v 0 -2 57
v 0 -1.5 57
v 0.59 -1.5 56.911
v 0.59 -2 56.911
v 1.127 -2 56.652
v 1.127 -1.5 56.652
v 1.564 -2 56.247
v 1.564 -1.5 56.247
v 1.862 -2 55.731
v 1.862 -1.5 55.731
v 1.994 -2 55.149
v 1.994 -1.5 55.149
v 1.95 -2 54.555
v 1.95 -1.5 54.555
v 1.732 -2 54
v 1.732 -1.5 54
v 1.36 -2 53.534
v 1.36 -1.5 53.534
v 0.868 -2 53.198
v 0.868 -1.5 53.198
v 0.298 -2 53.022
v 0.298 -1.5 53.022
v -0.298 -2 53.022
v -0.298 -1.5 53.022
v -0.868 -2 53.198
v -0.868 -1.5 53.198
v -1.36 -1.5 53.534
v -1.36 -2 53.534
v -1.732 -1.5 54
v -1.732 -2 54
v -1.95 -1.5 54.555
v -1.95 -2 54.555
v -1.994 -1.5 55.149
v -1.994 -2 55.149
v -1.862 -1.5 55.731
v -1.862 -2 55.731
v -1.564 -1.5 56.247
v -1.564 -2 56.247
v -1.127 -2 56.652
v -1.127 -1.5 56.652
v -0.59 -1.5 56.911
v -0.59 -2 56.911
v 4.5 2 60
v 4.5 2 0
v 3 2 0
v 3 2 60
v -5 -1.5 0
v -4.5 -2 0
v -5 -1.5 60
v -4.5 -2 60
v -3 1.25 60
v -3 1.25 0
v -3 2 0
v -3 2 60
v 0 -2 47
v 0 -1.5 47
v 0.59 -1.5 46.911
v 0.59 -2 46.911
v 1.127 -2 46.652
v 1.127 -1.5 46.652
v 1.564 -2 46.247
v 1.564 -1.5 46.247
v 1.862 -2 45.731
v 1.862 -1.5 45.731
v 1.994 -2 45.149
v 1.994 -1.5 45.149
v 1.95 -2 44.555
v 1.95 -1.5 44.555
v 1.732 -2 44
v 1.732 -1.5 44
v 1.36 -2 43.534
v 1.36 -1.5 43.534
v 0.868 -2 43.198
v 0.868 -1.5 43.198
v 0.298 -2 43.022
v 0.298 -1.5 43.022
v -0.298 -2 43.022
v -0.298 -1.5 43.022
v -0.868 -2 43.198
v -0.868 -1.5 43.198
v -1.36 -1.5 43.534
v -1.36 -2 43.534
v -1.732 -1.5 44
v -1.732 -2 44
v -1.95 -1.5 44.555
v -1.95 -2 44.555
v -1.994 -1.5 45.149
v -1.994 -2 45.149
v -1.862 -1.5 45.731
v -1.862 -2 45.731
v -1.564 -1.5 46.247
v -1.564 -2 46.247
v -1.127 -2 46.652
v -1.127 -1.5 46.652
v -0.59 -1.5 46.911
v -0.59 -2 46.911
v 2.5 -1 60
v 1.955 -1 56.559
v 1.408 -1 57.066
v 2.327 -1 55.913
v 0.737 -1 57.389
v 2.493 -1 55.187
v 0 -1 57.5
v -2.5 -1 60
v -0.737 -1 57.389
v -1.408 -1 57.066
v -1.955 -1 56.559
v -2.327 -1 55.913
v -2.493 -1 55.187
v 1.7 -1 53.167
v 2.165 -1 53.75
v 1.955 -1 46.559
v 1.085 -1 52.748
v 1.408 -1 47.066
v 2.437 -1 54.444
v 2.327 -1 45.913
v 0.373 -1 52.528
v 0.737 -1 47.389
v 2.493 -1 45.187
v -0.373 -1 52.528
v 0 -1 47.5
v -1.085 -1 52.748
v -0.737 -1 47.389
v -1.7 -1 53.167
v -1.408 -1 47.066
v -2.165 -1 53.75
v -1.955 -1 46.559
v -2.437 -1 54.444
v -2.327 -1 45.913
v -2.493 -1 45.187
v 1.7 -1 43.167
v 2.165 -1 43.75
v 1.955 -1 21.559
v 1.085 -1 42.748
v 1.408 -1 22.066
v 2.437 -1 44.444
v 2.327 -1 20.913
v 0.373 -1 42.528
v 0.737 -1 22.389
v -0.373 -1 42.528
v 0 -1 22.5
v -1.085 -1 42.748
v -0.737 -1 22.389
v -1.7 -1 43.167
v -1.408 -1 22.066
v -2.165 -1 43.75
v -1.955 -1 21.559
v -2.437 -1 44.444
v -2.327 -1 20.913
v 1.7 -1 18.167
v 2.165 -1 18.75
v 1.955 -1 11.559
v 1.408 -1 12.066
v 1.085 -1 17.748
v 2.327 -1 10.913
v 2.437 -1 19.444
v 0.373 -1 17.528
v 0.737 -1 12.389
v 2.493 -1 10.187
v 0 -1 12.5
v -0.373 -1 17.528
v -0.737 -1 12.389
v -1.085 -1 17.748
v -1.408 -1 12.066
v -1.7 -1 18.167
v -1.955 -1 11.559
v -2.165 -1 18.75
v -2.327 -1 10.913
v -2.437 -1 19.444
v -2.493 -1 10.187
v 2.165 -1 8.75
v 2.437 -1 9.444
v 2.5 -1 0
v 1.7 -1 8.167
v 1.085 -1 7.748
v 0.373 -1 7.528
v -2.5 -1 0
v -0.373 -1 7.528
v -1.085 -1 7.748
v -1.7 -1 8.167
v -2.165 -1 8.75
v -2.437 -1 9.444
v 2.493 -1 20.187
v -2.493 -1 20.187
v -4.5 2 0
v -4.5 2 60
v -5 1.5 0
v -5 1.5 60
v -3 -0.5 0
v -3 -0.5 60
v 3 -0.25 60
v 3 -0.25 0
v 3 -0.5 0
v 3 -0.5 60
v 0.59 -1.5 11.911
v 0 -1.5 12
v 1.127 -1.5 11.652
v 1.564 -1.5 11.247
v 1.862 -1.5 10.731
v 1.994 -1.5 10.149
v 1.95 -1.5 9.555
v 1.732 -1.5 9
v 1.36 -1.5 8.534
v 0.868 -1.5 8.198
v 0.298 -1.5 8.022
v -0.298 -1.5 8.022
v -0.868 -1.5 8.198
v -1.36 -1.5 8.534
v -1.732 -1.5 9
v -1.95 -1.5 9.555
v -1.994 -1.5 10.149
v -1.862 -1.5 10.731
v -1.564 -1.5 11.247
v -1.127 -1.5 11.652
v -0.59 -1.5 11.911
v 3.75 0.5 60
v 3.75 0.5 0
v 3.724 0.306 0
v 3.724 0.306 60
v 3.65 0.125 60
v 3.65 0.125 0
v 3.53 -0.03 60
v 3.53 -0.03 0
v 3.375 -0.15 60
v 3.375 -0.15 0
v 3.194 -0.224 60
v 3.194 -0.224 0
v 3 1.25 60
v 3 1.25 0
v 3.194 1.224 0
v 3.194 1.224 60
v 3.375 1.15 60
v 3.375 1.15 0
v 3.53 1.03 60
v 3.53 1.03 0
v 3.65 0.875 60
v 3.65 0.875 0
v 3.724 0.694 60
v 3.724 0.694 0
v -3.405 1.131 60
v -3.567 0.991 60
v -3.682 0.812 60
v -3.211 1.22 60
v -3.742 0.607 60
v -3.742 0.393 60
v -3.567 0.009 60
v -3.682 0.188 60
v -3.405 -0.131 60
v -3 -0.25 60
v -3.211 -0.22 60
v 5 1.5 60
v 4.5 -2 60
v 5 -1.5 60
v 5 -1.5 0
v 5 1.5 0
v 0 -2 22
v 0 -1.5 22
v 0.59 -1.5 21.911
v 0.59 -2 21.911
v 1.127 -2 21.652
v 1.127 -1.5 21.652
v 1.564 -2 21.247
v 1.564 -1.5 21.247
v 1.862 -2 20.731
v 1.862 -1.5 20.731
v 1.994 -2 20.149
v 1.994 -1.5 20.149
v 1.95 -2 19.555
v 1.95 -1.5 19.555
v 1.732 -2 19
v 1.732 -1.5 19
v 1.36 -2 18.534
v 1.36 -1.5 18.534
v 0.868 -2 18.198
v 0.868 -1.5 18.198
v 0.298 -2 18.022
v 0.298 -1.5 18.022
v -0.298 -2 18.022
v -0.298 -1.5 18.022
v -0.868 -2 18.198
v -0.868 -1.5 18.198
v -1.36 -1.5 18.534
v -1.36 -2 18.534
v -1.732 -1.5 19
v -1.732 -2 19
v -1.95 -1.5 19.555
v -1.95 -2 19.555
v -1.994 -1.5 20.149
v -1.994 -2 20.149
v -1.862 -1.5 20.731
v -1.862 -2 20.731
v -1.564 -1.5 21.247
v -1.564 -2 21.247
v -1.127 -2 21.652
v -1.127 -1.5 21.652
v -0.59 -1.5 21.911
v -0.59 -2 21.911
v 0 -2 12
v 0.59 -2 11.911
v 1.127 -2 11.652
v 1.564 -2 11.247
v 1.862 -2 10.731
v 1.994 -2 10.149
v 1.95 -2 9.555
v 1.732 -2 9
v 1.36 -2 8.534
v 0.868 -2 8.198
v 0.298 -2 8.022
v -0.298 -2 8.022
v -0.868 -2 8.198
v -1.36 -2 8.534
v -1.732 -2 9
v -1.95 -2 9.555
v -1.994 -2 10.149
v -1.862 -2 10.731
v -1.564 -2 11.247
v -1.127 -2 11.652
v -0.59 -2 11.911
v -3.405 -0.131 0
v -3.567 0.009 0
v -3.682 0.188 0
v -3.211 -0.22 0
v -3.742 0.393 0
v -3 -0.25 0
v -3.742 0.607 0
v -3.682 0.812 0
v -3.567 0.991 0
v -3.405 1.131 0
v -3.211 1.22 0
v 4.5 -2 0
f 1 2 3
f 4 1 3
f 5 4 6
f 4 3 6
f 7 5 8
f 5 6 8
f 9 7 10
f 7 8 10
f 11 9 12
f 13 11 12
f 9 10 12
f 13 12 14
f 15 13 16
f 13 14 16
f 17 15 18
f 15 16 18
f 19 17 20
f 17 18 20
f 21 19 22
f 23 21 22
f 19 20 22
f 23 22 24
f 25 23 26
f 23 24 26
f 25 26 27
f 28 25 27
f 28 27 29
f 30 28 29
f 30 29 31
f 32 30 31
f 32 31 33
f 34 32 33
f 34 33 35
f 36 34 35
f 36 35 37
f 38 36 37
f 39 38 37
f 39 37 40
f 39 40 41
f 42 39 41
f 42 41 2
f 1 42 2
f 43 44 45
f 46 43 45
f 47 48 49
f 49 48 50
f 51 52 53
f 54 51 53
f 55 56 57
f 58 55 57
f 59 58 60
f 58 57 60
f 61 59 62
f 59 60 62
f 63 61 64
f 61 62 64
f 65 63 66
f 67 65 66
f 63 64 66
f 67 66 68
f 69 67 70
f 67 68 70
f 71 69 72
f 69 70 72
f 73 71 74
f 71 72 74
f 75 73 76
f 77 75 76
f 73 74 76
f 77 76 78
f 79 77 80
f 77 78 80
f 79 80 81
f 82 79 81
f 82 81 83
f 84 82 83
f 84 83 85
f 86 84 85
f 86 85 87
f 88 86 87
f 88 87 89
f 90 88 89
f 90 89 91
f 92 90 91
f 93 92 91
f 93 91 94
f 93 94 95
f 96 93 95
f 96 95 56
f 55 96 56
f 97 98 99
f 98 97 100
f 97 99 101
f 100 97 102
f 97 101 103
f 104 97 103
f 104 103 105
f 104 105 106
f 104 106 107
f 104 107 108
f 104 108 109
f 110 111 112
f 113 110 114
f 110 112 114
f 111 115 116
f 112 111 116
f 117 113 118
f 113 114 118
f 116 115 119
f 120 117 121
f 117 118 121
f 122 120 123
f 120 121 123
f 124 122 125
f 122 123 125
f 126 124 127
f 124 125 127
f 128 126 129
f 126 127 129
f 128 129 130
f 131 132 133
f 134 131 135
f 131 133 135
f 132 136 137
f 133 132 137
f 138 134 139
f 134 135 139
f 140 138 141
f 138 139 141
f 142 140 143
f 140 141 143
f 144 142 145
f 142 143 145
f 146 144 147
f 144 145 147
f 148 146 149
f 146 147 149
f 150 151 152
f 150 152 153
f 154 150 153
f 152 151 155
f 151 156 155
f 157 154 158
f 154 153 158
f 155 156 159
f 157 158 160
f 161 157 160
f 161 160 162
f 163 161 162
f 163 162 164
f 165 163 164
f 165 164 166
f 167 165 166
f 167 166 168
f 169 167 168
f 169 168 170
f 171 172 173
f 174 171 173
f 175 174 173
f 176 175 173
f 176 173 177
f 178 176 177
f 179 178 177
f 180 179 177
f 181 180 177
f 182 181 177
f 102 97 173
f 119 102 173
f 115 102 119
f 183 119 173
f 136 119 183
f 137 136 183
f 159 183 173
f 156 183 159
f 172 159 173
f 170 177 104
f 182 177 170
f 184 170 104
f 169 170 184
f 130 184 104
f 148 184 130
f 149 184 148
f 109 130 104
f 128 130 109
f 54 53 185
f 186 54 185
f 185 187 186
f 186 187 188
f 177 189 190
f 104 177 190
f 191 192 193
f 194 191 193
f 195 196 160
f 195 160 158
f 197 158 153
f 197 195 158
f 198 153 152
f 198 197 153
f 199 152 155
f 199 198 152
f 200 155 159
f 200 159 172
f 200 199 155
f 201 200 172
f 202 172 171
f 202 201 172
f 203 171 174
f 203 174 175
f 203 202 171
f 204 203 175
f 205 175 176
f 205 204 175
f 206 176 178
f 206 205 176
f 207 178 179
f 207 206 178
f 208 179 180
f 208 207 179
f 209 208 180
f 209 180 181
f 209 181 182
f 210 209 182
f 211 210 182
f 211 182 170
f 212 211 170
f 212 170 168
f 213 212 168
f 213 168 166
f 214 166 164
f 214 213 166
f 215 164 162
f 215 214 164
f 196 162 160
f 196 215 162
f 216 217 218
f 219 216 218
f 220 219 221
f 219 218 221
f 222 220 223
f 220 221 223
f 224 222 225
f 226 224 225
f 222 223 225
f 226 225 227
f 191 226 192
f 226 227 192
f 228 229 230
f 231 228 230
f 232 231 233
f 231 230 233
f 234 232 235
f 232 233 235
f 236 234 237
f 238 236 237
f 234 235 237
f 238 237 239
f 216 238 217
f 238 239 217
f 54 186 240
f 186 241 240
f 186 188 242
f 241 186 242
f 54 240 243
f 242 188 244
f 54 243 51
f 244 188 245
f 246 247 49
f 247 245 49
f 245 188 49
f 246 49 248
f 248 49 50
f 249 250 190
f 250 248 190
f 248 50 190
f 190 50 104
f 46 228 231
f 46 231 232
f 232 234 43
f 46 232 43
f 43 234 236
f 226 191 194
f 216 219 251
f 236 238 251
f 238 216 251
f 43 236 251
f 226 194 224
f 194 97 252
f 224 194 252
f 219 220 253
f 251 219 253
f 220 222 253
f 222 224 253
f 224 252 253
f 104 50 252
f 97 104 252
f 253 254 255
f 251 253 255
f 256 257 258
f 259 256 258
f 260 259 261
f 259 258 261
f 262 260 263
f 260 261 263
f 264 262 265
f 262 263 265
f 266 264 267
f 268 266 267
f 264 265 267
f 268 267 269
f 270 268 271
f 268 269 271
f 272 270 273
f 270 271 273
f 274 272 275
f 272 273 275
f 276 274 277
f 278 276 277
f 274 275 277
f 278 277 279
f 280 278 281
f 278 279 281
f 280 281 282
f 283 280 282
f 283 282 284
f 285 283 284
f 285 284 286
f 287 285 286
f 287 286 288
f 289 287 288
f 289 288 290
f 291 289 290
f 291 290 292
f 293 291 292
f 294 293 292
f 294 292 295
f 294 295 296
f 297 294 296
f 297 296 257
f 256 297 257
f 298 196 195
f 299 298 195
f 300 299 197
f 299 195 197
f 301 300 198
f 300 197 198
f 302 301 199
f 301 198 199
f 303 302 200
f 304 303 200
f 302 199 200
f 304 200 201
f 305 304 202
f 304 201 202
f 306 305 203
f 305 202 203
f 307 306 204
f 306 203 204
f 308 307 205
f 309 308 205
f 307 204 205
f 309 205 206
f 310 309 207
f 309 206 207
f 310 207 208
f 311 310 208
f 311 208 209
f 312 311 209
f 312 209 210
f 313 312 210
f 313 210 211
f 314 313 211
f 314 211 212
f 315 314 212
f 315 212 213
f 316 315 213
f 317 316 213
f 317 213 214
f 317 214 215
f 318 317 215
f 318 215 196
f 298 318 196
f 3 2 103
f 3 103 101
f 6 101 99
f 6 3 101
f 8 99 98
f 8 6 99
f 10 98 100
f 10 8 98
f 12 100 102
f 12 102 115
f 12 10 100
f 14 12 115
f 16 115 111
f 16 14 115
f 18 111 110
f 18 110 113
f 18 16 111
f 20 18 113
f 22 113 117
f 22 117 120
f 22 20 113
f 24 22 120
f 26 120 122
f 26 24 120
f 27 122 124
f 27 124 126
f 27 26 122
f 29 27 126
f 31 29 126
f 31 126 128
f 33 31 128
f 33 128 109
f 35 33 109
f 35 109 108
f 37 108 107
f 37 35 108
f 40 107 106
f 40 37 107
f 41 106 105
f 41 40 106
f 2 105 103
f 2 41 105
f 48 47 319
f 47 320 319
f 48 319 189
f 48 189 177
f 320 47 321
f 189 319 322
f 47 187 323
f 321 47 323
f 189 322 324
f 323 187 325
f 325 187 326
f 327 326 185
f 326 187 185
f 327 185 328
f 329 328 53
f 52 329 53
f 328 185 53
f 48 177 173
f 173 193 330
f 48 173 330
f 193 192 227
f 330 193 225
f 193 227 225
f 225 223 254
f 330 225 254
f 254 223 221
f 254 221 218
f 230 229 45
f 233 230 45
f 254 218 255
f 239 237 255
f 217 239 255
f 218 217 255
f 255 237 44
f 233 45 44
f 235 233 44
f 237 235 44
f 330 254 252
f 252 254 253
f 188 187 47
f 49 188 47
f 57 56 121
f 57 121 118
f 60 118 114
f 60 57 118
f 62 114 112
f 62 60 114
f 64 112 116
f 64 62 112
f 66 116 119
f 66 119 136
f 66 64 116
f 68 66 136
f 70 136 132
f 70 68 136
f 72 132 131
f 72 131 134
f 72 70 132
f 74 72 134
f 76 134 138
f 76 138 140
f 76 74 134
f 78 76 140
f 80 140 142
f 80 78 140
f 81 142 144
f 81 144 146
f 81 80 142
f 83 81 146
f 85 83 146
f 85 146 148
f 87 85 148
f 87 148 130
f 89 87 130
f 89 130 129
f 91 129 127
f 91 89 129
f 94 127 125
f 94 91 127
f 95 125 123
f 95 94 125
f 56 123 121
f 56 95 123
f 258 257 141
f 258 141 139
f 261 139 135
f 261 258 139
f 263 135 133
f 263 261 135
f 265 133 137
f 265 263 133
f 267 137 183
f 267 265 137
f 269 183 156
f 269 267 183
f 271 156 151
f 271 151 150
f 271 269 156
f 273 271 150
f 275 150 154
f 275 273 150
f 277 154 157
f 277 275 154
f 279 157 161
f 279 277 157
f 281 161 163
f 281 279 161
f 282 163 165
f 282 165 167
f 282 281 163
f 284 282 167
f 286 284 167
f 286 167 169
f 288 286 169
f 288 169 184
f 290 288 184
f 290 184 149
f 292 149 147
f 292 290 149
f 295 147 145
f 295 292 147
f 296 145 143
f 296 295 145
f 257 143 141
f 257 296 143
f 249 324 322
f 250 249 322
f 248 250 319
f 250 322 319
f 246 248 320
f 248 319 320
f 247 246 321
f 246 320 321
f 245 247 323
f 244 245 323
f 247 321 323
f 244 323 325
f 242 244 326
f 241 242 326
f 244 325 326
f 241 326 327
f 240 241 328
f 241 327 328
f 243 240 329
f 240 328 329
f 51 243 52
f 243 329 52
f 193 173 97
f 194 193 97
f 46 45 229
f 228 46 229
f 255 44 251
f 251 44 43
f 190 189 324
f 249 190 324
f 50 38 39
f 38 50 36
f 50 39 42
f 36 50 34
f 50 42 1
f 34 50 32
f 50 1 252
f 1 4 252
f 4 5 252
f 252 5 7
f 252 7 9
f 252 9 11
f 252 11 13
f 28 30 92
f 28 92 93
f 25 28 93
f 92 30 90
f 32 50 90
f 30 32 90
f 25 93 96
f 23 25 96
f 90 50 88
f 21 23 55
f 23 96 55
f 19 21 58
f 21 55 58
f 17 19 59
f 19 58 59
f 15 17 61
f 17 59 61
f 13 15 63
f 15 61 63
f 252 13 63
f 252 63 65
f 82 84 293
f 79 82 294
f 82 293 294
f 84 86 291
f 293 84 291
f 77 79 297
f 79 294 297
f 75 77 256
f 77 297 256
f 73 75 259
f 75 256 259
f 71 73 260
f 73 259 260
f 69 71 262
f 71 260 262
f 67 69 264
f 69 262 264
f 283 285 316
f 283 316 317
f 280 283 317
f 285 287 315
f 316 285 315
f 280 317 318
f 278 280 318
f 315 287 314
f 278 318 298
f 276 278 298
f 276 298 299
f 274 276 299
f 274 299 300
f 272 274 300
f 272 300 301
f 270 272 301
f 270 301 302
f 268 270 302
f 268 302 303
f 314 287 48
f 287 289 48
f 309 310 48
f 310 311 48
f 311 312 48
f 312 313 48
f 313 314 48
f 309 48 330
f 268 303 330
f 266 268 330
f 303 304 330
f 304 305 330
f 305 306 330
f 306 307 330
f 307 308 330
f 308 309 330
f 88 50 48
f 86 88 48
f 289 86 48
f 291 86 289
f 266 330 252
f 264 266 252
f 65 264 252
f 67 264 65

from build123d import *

# Parameters (mm, degrees)
BOSS_EXTRUDE1_DEPTH        = 100
CHAMFER1_SIZE              = 0.5
SKETCH5_R                  = 2
CUT_EXTRUDE1_DEPTH         = 200
CHAMFER2_SIZE              = 0.5
LPATTERN1_COUNT            = 3
LPATTERN1_PITCH            = 35
CHAMFER2_OF_LPATTERN1_SIZE = 0.5
CUT_EXTRUDE2_DEPTH         = 10
CUT_EXTRUDE2_DEPTH_BACK    = 10
SKETCH6_W                  = 15
SKETCH6_H                  = 40


with BuildPart() as part:
    # Sketch1 → Boss-Extrude1 (new body)
    with BuildSketch(Plane.XY):
        with BuildLine():
            Line((-3, 2), (-5, 2))
            Line((-5, 2), (-5, -2))
            Line((-5, -2), (5, -2))
            Line((5, -2), (5, 2))
            Line((5, 2), (3, 2))
            Line((3, 2), (3, 1.25))
            ThreePointArc((3, 1.25), (3.530330086, 1.030330086), (3.75, 0.5))
            ThreePointArc((3.75, 0.5), (3.530330086, -0.030330086), (3, -0.25))
            Line((3, -0.25), (3, -1))
            Line((3, -1), (-3, -1))
            Line((-3, -1), (-3, -0.25))
            ThreePointArc((-3, -0.25), (-3.75, 0.5), (-3, 1.25))
            Line((-3, 1.25), (-3, 2))
        make_face()
    extrude(amount=BOSS_EXTRUDE1_DEPTH)

    # Chamfer1
    chamfer1_edges = [part.edges().sort_by_distance(p)[0] for p in [
        (-3, -1, 50),
        (3, -1, 50),
        (5, 2, 50),
        (5, -2, 50),
        (-5, -2, 50),
        (-5, 2, 50),
    ]]
    chamfer(chamfer1_edges, length=CHAMFER1_SIZE)

    # Sketch5 → Cut-Extrude1 (cut)
    with BuildSketch(Plane(origin=(0, -1, 0), x_dir=(1, 0, 0), z_dir=(0, 1, 0))):
        with Locations(Location((0, -10, 0), (0, 0, 270))):
            Circle(SKETCH5_R)
        with Locations(Location((0, -20, 0), (0, 0, 270))):
            Circle(SKETCH5_R)
    cut_extrude1 = extrude(amount=-CUT_EXTRUDE1_DEPTH, mode=Mode.SUBTRACT)

    # Chamfer2
    chamfer2_edges = [part.edges().sort_by_distance(p)[0] for p in [
        (0, -1, 8),
        (0, -1, 18),
    ]]
    chamfer(chamfer2_edges, length=CHAMFER2_SIZE - 0.0001)  # a hair under: the kernel refuses the full size

    # LPattern1: Cut-Extrude1 ×3
    with Locations(*[(0, 0, i * LPATTERN1_PITCH) for i in range(1, LPATTERN1_COUNT)]):
        add(cut_extrude1, mode=Mode.SUBTRACT)

    # Chamfer2 of LPattern1
    chamfer2_of_lpattern1_edges = [part.edges().sort_by_distance(p)[0] for p in [
        (0, -1, 43),
        (0, -1, 53),
        (0, -1, 78),
        (0, -1, 88),
    ]]
    chamfer(chamfer2_of_lpattern1_edges, length=CHAMFER2_OF_LPATTERN1_SIZE - 0.0001)  # a hair under: the kernel refuses the full size

    # Sketch6 → Cut-Extrude2 (cut, two sides: drawn at the far end of the back side and taken through both)
    with BuildSketch(Plane(origin=(0, 0, 0), x_dir=(1, 0, 0), z_dir=(0, 1, 0)).offset(-CUT_EXTRUDE2_DEPTH_BACK)):
        with Locations((0, -80)):
            Rectangle(SKETCH6_W, SKETCH6_H)
    extrude(amount=CUT_EXTRUDE2_DEPTH + CUT_EXTRUDE2_DEPTH_BACK, mode=Mode.SUBTRACT)


solid = part.part
